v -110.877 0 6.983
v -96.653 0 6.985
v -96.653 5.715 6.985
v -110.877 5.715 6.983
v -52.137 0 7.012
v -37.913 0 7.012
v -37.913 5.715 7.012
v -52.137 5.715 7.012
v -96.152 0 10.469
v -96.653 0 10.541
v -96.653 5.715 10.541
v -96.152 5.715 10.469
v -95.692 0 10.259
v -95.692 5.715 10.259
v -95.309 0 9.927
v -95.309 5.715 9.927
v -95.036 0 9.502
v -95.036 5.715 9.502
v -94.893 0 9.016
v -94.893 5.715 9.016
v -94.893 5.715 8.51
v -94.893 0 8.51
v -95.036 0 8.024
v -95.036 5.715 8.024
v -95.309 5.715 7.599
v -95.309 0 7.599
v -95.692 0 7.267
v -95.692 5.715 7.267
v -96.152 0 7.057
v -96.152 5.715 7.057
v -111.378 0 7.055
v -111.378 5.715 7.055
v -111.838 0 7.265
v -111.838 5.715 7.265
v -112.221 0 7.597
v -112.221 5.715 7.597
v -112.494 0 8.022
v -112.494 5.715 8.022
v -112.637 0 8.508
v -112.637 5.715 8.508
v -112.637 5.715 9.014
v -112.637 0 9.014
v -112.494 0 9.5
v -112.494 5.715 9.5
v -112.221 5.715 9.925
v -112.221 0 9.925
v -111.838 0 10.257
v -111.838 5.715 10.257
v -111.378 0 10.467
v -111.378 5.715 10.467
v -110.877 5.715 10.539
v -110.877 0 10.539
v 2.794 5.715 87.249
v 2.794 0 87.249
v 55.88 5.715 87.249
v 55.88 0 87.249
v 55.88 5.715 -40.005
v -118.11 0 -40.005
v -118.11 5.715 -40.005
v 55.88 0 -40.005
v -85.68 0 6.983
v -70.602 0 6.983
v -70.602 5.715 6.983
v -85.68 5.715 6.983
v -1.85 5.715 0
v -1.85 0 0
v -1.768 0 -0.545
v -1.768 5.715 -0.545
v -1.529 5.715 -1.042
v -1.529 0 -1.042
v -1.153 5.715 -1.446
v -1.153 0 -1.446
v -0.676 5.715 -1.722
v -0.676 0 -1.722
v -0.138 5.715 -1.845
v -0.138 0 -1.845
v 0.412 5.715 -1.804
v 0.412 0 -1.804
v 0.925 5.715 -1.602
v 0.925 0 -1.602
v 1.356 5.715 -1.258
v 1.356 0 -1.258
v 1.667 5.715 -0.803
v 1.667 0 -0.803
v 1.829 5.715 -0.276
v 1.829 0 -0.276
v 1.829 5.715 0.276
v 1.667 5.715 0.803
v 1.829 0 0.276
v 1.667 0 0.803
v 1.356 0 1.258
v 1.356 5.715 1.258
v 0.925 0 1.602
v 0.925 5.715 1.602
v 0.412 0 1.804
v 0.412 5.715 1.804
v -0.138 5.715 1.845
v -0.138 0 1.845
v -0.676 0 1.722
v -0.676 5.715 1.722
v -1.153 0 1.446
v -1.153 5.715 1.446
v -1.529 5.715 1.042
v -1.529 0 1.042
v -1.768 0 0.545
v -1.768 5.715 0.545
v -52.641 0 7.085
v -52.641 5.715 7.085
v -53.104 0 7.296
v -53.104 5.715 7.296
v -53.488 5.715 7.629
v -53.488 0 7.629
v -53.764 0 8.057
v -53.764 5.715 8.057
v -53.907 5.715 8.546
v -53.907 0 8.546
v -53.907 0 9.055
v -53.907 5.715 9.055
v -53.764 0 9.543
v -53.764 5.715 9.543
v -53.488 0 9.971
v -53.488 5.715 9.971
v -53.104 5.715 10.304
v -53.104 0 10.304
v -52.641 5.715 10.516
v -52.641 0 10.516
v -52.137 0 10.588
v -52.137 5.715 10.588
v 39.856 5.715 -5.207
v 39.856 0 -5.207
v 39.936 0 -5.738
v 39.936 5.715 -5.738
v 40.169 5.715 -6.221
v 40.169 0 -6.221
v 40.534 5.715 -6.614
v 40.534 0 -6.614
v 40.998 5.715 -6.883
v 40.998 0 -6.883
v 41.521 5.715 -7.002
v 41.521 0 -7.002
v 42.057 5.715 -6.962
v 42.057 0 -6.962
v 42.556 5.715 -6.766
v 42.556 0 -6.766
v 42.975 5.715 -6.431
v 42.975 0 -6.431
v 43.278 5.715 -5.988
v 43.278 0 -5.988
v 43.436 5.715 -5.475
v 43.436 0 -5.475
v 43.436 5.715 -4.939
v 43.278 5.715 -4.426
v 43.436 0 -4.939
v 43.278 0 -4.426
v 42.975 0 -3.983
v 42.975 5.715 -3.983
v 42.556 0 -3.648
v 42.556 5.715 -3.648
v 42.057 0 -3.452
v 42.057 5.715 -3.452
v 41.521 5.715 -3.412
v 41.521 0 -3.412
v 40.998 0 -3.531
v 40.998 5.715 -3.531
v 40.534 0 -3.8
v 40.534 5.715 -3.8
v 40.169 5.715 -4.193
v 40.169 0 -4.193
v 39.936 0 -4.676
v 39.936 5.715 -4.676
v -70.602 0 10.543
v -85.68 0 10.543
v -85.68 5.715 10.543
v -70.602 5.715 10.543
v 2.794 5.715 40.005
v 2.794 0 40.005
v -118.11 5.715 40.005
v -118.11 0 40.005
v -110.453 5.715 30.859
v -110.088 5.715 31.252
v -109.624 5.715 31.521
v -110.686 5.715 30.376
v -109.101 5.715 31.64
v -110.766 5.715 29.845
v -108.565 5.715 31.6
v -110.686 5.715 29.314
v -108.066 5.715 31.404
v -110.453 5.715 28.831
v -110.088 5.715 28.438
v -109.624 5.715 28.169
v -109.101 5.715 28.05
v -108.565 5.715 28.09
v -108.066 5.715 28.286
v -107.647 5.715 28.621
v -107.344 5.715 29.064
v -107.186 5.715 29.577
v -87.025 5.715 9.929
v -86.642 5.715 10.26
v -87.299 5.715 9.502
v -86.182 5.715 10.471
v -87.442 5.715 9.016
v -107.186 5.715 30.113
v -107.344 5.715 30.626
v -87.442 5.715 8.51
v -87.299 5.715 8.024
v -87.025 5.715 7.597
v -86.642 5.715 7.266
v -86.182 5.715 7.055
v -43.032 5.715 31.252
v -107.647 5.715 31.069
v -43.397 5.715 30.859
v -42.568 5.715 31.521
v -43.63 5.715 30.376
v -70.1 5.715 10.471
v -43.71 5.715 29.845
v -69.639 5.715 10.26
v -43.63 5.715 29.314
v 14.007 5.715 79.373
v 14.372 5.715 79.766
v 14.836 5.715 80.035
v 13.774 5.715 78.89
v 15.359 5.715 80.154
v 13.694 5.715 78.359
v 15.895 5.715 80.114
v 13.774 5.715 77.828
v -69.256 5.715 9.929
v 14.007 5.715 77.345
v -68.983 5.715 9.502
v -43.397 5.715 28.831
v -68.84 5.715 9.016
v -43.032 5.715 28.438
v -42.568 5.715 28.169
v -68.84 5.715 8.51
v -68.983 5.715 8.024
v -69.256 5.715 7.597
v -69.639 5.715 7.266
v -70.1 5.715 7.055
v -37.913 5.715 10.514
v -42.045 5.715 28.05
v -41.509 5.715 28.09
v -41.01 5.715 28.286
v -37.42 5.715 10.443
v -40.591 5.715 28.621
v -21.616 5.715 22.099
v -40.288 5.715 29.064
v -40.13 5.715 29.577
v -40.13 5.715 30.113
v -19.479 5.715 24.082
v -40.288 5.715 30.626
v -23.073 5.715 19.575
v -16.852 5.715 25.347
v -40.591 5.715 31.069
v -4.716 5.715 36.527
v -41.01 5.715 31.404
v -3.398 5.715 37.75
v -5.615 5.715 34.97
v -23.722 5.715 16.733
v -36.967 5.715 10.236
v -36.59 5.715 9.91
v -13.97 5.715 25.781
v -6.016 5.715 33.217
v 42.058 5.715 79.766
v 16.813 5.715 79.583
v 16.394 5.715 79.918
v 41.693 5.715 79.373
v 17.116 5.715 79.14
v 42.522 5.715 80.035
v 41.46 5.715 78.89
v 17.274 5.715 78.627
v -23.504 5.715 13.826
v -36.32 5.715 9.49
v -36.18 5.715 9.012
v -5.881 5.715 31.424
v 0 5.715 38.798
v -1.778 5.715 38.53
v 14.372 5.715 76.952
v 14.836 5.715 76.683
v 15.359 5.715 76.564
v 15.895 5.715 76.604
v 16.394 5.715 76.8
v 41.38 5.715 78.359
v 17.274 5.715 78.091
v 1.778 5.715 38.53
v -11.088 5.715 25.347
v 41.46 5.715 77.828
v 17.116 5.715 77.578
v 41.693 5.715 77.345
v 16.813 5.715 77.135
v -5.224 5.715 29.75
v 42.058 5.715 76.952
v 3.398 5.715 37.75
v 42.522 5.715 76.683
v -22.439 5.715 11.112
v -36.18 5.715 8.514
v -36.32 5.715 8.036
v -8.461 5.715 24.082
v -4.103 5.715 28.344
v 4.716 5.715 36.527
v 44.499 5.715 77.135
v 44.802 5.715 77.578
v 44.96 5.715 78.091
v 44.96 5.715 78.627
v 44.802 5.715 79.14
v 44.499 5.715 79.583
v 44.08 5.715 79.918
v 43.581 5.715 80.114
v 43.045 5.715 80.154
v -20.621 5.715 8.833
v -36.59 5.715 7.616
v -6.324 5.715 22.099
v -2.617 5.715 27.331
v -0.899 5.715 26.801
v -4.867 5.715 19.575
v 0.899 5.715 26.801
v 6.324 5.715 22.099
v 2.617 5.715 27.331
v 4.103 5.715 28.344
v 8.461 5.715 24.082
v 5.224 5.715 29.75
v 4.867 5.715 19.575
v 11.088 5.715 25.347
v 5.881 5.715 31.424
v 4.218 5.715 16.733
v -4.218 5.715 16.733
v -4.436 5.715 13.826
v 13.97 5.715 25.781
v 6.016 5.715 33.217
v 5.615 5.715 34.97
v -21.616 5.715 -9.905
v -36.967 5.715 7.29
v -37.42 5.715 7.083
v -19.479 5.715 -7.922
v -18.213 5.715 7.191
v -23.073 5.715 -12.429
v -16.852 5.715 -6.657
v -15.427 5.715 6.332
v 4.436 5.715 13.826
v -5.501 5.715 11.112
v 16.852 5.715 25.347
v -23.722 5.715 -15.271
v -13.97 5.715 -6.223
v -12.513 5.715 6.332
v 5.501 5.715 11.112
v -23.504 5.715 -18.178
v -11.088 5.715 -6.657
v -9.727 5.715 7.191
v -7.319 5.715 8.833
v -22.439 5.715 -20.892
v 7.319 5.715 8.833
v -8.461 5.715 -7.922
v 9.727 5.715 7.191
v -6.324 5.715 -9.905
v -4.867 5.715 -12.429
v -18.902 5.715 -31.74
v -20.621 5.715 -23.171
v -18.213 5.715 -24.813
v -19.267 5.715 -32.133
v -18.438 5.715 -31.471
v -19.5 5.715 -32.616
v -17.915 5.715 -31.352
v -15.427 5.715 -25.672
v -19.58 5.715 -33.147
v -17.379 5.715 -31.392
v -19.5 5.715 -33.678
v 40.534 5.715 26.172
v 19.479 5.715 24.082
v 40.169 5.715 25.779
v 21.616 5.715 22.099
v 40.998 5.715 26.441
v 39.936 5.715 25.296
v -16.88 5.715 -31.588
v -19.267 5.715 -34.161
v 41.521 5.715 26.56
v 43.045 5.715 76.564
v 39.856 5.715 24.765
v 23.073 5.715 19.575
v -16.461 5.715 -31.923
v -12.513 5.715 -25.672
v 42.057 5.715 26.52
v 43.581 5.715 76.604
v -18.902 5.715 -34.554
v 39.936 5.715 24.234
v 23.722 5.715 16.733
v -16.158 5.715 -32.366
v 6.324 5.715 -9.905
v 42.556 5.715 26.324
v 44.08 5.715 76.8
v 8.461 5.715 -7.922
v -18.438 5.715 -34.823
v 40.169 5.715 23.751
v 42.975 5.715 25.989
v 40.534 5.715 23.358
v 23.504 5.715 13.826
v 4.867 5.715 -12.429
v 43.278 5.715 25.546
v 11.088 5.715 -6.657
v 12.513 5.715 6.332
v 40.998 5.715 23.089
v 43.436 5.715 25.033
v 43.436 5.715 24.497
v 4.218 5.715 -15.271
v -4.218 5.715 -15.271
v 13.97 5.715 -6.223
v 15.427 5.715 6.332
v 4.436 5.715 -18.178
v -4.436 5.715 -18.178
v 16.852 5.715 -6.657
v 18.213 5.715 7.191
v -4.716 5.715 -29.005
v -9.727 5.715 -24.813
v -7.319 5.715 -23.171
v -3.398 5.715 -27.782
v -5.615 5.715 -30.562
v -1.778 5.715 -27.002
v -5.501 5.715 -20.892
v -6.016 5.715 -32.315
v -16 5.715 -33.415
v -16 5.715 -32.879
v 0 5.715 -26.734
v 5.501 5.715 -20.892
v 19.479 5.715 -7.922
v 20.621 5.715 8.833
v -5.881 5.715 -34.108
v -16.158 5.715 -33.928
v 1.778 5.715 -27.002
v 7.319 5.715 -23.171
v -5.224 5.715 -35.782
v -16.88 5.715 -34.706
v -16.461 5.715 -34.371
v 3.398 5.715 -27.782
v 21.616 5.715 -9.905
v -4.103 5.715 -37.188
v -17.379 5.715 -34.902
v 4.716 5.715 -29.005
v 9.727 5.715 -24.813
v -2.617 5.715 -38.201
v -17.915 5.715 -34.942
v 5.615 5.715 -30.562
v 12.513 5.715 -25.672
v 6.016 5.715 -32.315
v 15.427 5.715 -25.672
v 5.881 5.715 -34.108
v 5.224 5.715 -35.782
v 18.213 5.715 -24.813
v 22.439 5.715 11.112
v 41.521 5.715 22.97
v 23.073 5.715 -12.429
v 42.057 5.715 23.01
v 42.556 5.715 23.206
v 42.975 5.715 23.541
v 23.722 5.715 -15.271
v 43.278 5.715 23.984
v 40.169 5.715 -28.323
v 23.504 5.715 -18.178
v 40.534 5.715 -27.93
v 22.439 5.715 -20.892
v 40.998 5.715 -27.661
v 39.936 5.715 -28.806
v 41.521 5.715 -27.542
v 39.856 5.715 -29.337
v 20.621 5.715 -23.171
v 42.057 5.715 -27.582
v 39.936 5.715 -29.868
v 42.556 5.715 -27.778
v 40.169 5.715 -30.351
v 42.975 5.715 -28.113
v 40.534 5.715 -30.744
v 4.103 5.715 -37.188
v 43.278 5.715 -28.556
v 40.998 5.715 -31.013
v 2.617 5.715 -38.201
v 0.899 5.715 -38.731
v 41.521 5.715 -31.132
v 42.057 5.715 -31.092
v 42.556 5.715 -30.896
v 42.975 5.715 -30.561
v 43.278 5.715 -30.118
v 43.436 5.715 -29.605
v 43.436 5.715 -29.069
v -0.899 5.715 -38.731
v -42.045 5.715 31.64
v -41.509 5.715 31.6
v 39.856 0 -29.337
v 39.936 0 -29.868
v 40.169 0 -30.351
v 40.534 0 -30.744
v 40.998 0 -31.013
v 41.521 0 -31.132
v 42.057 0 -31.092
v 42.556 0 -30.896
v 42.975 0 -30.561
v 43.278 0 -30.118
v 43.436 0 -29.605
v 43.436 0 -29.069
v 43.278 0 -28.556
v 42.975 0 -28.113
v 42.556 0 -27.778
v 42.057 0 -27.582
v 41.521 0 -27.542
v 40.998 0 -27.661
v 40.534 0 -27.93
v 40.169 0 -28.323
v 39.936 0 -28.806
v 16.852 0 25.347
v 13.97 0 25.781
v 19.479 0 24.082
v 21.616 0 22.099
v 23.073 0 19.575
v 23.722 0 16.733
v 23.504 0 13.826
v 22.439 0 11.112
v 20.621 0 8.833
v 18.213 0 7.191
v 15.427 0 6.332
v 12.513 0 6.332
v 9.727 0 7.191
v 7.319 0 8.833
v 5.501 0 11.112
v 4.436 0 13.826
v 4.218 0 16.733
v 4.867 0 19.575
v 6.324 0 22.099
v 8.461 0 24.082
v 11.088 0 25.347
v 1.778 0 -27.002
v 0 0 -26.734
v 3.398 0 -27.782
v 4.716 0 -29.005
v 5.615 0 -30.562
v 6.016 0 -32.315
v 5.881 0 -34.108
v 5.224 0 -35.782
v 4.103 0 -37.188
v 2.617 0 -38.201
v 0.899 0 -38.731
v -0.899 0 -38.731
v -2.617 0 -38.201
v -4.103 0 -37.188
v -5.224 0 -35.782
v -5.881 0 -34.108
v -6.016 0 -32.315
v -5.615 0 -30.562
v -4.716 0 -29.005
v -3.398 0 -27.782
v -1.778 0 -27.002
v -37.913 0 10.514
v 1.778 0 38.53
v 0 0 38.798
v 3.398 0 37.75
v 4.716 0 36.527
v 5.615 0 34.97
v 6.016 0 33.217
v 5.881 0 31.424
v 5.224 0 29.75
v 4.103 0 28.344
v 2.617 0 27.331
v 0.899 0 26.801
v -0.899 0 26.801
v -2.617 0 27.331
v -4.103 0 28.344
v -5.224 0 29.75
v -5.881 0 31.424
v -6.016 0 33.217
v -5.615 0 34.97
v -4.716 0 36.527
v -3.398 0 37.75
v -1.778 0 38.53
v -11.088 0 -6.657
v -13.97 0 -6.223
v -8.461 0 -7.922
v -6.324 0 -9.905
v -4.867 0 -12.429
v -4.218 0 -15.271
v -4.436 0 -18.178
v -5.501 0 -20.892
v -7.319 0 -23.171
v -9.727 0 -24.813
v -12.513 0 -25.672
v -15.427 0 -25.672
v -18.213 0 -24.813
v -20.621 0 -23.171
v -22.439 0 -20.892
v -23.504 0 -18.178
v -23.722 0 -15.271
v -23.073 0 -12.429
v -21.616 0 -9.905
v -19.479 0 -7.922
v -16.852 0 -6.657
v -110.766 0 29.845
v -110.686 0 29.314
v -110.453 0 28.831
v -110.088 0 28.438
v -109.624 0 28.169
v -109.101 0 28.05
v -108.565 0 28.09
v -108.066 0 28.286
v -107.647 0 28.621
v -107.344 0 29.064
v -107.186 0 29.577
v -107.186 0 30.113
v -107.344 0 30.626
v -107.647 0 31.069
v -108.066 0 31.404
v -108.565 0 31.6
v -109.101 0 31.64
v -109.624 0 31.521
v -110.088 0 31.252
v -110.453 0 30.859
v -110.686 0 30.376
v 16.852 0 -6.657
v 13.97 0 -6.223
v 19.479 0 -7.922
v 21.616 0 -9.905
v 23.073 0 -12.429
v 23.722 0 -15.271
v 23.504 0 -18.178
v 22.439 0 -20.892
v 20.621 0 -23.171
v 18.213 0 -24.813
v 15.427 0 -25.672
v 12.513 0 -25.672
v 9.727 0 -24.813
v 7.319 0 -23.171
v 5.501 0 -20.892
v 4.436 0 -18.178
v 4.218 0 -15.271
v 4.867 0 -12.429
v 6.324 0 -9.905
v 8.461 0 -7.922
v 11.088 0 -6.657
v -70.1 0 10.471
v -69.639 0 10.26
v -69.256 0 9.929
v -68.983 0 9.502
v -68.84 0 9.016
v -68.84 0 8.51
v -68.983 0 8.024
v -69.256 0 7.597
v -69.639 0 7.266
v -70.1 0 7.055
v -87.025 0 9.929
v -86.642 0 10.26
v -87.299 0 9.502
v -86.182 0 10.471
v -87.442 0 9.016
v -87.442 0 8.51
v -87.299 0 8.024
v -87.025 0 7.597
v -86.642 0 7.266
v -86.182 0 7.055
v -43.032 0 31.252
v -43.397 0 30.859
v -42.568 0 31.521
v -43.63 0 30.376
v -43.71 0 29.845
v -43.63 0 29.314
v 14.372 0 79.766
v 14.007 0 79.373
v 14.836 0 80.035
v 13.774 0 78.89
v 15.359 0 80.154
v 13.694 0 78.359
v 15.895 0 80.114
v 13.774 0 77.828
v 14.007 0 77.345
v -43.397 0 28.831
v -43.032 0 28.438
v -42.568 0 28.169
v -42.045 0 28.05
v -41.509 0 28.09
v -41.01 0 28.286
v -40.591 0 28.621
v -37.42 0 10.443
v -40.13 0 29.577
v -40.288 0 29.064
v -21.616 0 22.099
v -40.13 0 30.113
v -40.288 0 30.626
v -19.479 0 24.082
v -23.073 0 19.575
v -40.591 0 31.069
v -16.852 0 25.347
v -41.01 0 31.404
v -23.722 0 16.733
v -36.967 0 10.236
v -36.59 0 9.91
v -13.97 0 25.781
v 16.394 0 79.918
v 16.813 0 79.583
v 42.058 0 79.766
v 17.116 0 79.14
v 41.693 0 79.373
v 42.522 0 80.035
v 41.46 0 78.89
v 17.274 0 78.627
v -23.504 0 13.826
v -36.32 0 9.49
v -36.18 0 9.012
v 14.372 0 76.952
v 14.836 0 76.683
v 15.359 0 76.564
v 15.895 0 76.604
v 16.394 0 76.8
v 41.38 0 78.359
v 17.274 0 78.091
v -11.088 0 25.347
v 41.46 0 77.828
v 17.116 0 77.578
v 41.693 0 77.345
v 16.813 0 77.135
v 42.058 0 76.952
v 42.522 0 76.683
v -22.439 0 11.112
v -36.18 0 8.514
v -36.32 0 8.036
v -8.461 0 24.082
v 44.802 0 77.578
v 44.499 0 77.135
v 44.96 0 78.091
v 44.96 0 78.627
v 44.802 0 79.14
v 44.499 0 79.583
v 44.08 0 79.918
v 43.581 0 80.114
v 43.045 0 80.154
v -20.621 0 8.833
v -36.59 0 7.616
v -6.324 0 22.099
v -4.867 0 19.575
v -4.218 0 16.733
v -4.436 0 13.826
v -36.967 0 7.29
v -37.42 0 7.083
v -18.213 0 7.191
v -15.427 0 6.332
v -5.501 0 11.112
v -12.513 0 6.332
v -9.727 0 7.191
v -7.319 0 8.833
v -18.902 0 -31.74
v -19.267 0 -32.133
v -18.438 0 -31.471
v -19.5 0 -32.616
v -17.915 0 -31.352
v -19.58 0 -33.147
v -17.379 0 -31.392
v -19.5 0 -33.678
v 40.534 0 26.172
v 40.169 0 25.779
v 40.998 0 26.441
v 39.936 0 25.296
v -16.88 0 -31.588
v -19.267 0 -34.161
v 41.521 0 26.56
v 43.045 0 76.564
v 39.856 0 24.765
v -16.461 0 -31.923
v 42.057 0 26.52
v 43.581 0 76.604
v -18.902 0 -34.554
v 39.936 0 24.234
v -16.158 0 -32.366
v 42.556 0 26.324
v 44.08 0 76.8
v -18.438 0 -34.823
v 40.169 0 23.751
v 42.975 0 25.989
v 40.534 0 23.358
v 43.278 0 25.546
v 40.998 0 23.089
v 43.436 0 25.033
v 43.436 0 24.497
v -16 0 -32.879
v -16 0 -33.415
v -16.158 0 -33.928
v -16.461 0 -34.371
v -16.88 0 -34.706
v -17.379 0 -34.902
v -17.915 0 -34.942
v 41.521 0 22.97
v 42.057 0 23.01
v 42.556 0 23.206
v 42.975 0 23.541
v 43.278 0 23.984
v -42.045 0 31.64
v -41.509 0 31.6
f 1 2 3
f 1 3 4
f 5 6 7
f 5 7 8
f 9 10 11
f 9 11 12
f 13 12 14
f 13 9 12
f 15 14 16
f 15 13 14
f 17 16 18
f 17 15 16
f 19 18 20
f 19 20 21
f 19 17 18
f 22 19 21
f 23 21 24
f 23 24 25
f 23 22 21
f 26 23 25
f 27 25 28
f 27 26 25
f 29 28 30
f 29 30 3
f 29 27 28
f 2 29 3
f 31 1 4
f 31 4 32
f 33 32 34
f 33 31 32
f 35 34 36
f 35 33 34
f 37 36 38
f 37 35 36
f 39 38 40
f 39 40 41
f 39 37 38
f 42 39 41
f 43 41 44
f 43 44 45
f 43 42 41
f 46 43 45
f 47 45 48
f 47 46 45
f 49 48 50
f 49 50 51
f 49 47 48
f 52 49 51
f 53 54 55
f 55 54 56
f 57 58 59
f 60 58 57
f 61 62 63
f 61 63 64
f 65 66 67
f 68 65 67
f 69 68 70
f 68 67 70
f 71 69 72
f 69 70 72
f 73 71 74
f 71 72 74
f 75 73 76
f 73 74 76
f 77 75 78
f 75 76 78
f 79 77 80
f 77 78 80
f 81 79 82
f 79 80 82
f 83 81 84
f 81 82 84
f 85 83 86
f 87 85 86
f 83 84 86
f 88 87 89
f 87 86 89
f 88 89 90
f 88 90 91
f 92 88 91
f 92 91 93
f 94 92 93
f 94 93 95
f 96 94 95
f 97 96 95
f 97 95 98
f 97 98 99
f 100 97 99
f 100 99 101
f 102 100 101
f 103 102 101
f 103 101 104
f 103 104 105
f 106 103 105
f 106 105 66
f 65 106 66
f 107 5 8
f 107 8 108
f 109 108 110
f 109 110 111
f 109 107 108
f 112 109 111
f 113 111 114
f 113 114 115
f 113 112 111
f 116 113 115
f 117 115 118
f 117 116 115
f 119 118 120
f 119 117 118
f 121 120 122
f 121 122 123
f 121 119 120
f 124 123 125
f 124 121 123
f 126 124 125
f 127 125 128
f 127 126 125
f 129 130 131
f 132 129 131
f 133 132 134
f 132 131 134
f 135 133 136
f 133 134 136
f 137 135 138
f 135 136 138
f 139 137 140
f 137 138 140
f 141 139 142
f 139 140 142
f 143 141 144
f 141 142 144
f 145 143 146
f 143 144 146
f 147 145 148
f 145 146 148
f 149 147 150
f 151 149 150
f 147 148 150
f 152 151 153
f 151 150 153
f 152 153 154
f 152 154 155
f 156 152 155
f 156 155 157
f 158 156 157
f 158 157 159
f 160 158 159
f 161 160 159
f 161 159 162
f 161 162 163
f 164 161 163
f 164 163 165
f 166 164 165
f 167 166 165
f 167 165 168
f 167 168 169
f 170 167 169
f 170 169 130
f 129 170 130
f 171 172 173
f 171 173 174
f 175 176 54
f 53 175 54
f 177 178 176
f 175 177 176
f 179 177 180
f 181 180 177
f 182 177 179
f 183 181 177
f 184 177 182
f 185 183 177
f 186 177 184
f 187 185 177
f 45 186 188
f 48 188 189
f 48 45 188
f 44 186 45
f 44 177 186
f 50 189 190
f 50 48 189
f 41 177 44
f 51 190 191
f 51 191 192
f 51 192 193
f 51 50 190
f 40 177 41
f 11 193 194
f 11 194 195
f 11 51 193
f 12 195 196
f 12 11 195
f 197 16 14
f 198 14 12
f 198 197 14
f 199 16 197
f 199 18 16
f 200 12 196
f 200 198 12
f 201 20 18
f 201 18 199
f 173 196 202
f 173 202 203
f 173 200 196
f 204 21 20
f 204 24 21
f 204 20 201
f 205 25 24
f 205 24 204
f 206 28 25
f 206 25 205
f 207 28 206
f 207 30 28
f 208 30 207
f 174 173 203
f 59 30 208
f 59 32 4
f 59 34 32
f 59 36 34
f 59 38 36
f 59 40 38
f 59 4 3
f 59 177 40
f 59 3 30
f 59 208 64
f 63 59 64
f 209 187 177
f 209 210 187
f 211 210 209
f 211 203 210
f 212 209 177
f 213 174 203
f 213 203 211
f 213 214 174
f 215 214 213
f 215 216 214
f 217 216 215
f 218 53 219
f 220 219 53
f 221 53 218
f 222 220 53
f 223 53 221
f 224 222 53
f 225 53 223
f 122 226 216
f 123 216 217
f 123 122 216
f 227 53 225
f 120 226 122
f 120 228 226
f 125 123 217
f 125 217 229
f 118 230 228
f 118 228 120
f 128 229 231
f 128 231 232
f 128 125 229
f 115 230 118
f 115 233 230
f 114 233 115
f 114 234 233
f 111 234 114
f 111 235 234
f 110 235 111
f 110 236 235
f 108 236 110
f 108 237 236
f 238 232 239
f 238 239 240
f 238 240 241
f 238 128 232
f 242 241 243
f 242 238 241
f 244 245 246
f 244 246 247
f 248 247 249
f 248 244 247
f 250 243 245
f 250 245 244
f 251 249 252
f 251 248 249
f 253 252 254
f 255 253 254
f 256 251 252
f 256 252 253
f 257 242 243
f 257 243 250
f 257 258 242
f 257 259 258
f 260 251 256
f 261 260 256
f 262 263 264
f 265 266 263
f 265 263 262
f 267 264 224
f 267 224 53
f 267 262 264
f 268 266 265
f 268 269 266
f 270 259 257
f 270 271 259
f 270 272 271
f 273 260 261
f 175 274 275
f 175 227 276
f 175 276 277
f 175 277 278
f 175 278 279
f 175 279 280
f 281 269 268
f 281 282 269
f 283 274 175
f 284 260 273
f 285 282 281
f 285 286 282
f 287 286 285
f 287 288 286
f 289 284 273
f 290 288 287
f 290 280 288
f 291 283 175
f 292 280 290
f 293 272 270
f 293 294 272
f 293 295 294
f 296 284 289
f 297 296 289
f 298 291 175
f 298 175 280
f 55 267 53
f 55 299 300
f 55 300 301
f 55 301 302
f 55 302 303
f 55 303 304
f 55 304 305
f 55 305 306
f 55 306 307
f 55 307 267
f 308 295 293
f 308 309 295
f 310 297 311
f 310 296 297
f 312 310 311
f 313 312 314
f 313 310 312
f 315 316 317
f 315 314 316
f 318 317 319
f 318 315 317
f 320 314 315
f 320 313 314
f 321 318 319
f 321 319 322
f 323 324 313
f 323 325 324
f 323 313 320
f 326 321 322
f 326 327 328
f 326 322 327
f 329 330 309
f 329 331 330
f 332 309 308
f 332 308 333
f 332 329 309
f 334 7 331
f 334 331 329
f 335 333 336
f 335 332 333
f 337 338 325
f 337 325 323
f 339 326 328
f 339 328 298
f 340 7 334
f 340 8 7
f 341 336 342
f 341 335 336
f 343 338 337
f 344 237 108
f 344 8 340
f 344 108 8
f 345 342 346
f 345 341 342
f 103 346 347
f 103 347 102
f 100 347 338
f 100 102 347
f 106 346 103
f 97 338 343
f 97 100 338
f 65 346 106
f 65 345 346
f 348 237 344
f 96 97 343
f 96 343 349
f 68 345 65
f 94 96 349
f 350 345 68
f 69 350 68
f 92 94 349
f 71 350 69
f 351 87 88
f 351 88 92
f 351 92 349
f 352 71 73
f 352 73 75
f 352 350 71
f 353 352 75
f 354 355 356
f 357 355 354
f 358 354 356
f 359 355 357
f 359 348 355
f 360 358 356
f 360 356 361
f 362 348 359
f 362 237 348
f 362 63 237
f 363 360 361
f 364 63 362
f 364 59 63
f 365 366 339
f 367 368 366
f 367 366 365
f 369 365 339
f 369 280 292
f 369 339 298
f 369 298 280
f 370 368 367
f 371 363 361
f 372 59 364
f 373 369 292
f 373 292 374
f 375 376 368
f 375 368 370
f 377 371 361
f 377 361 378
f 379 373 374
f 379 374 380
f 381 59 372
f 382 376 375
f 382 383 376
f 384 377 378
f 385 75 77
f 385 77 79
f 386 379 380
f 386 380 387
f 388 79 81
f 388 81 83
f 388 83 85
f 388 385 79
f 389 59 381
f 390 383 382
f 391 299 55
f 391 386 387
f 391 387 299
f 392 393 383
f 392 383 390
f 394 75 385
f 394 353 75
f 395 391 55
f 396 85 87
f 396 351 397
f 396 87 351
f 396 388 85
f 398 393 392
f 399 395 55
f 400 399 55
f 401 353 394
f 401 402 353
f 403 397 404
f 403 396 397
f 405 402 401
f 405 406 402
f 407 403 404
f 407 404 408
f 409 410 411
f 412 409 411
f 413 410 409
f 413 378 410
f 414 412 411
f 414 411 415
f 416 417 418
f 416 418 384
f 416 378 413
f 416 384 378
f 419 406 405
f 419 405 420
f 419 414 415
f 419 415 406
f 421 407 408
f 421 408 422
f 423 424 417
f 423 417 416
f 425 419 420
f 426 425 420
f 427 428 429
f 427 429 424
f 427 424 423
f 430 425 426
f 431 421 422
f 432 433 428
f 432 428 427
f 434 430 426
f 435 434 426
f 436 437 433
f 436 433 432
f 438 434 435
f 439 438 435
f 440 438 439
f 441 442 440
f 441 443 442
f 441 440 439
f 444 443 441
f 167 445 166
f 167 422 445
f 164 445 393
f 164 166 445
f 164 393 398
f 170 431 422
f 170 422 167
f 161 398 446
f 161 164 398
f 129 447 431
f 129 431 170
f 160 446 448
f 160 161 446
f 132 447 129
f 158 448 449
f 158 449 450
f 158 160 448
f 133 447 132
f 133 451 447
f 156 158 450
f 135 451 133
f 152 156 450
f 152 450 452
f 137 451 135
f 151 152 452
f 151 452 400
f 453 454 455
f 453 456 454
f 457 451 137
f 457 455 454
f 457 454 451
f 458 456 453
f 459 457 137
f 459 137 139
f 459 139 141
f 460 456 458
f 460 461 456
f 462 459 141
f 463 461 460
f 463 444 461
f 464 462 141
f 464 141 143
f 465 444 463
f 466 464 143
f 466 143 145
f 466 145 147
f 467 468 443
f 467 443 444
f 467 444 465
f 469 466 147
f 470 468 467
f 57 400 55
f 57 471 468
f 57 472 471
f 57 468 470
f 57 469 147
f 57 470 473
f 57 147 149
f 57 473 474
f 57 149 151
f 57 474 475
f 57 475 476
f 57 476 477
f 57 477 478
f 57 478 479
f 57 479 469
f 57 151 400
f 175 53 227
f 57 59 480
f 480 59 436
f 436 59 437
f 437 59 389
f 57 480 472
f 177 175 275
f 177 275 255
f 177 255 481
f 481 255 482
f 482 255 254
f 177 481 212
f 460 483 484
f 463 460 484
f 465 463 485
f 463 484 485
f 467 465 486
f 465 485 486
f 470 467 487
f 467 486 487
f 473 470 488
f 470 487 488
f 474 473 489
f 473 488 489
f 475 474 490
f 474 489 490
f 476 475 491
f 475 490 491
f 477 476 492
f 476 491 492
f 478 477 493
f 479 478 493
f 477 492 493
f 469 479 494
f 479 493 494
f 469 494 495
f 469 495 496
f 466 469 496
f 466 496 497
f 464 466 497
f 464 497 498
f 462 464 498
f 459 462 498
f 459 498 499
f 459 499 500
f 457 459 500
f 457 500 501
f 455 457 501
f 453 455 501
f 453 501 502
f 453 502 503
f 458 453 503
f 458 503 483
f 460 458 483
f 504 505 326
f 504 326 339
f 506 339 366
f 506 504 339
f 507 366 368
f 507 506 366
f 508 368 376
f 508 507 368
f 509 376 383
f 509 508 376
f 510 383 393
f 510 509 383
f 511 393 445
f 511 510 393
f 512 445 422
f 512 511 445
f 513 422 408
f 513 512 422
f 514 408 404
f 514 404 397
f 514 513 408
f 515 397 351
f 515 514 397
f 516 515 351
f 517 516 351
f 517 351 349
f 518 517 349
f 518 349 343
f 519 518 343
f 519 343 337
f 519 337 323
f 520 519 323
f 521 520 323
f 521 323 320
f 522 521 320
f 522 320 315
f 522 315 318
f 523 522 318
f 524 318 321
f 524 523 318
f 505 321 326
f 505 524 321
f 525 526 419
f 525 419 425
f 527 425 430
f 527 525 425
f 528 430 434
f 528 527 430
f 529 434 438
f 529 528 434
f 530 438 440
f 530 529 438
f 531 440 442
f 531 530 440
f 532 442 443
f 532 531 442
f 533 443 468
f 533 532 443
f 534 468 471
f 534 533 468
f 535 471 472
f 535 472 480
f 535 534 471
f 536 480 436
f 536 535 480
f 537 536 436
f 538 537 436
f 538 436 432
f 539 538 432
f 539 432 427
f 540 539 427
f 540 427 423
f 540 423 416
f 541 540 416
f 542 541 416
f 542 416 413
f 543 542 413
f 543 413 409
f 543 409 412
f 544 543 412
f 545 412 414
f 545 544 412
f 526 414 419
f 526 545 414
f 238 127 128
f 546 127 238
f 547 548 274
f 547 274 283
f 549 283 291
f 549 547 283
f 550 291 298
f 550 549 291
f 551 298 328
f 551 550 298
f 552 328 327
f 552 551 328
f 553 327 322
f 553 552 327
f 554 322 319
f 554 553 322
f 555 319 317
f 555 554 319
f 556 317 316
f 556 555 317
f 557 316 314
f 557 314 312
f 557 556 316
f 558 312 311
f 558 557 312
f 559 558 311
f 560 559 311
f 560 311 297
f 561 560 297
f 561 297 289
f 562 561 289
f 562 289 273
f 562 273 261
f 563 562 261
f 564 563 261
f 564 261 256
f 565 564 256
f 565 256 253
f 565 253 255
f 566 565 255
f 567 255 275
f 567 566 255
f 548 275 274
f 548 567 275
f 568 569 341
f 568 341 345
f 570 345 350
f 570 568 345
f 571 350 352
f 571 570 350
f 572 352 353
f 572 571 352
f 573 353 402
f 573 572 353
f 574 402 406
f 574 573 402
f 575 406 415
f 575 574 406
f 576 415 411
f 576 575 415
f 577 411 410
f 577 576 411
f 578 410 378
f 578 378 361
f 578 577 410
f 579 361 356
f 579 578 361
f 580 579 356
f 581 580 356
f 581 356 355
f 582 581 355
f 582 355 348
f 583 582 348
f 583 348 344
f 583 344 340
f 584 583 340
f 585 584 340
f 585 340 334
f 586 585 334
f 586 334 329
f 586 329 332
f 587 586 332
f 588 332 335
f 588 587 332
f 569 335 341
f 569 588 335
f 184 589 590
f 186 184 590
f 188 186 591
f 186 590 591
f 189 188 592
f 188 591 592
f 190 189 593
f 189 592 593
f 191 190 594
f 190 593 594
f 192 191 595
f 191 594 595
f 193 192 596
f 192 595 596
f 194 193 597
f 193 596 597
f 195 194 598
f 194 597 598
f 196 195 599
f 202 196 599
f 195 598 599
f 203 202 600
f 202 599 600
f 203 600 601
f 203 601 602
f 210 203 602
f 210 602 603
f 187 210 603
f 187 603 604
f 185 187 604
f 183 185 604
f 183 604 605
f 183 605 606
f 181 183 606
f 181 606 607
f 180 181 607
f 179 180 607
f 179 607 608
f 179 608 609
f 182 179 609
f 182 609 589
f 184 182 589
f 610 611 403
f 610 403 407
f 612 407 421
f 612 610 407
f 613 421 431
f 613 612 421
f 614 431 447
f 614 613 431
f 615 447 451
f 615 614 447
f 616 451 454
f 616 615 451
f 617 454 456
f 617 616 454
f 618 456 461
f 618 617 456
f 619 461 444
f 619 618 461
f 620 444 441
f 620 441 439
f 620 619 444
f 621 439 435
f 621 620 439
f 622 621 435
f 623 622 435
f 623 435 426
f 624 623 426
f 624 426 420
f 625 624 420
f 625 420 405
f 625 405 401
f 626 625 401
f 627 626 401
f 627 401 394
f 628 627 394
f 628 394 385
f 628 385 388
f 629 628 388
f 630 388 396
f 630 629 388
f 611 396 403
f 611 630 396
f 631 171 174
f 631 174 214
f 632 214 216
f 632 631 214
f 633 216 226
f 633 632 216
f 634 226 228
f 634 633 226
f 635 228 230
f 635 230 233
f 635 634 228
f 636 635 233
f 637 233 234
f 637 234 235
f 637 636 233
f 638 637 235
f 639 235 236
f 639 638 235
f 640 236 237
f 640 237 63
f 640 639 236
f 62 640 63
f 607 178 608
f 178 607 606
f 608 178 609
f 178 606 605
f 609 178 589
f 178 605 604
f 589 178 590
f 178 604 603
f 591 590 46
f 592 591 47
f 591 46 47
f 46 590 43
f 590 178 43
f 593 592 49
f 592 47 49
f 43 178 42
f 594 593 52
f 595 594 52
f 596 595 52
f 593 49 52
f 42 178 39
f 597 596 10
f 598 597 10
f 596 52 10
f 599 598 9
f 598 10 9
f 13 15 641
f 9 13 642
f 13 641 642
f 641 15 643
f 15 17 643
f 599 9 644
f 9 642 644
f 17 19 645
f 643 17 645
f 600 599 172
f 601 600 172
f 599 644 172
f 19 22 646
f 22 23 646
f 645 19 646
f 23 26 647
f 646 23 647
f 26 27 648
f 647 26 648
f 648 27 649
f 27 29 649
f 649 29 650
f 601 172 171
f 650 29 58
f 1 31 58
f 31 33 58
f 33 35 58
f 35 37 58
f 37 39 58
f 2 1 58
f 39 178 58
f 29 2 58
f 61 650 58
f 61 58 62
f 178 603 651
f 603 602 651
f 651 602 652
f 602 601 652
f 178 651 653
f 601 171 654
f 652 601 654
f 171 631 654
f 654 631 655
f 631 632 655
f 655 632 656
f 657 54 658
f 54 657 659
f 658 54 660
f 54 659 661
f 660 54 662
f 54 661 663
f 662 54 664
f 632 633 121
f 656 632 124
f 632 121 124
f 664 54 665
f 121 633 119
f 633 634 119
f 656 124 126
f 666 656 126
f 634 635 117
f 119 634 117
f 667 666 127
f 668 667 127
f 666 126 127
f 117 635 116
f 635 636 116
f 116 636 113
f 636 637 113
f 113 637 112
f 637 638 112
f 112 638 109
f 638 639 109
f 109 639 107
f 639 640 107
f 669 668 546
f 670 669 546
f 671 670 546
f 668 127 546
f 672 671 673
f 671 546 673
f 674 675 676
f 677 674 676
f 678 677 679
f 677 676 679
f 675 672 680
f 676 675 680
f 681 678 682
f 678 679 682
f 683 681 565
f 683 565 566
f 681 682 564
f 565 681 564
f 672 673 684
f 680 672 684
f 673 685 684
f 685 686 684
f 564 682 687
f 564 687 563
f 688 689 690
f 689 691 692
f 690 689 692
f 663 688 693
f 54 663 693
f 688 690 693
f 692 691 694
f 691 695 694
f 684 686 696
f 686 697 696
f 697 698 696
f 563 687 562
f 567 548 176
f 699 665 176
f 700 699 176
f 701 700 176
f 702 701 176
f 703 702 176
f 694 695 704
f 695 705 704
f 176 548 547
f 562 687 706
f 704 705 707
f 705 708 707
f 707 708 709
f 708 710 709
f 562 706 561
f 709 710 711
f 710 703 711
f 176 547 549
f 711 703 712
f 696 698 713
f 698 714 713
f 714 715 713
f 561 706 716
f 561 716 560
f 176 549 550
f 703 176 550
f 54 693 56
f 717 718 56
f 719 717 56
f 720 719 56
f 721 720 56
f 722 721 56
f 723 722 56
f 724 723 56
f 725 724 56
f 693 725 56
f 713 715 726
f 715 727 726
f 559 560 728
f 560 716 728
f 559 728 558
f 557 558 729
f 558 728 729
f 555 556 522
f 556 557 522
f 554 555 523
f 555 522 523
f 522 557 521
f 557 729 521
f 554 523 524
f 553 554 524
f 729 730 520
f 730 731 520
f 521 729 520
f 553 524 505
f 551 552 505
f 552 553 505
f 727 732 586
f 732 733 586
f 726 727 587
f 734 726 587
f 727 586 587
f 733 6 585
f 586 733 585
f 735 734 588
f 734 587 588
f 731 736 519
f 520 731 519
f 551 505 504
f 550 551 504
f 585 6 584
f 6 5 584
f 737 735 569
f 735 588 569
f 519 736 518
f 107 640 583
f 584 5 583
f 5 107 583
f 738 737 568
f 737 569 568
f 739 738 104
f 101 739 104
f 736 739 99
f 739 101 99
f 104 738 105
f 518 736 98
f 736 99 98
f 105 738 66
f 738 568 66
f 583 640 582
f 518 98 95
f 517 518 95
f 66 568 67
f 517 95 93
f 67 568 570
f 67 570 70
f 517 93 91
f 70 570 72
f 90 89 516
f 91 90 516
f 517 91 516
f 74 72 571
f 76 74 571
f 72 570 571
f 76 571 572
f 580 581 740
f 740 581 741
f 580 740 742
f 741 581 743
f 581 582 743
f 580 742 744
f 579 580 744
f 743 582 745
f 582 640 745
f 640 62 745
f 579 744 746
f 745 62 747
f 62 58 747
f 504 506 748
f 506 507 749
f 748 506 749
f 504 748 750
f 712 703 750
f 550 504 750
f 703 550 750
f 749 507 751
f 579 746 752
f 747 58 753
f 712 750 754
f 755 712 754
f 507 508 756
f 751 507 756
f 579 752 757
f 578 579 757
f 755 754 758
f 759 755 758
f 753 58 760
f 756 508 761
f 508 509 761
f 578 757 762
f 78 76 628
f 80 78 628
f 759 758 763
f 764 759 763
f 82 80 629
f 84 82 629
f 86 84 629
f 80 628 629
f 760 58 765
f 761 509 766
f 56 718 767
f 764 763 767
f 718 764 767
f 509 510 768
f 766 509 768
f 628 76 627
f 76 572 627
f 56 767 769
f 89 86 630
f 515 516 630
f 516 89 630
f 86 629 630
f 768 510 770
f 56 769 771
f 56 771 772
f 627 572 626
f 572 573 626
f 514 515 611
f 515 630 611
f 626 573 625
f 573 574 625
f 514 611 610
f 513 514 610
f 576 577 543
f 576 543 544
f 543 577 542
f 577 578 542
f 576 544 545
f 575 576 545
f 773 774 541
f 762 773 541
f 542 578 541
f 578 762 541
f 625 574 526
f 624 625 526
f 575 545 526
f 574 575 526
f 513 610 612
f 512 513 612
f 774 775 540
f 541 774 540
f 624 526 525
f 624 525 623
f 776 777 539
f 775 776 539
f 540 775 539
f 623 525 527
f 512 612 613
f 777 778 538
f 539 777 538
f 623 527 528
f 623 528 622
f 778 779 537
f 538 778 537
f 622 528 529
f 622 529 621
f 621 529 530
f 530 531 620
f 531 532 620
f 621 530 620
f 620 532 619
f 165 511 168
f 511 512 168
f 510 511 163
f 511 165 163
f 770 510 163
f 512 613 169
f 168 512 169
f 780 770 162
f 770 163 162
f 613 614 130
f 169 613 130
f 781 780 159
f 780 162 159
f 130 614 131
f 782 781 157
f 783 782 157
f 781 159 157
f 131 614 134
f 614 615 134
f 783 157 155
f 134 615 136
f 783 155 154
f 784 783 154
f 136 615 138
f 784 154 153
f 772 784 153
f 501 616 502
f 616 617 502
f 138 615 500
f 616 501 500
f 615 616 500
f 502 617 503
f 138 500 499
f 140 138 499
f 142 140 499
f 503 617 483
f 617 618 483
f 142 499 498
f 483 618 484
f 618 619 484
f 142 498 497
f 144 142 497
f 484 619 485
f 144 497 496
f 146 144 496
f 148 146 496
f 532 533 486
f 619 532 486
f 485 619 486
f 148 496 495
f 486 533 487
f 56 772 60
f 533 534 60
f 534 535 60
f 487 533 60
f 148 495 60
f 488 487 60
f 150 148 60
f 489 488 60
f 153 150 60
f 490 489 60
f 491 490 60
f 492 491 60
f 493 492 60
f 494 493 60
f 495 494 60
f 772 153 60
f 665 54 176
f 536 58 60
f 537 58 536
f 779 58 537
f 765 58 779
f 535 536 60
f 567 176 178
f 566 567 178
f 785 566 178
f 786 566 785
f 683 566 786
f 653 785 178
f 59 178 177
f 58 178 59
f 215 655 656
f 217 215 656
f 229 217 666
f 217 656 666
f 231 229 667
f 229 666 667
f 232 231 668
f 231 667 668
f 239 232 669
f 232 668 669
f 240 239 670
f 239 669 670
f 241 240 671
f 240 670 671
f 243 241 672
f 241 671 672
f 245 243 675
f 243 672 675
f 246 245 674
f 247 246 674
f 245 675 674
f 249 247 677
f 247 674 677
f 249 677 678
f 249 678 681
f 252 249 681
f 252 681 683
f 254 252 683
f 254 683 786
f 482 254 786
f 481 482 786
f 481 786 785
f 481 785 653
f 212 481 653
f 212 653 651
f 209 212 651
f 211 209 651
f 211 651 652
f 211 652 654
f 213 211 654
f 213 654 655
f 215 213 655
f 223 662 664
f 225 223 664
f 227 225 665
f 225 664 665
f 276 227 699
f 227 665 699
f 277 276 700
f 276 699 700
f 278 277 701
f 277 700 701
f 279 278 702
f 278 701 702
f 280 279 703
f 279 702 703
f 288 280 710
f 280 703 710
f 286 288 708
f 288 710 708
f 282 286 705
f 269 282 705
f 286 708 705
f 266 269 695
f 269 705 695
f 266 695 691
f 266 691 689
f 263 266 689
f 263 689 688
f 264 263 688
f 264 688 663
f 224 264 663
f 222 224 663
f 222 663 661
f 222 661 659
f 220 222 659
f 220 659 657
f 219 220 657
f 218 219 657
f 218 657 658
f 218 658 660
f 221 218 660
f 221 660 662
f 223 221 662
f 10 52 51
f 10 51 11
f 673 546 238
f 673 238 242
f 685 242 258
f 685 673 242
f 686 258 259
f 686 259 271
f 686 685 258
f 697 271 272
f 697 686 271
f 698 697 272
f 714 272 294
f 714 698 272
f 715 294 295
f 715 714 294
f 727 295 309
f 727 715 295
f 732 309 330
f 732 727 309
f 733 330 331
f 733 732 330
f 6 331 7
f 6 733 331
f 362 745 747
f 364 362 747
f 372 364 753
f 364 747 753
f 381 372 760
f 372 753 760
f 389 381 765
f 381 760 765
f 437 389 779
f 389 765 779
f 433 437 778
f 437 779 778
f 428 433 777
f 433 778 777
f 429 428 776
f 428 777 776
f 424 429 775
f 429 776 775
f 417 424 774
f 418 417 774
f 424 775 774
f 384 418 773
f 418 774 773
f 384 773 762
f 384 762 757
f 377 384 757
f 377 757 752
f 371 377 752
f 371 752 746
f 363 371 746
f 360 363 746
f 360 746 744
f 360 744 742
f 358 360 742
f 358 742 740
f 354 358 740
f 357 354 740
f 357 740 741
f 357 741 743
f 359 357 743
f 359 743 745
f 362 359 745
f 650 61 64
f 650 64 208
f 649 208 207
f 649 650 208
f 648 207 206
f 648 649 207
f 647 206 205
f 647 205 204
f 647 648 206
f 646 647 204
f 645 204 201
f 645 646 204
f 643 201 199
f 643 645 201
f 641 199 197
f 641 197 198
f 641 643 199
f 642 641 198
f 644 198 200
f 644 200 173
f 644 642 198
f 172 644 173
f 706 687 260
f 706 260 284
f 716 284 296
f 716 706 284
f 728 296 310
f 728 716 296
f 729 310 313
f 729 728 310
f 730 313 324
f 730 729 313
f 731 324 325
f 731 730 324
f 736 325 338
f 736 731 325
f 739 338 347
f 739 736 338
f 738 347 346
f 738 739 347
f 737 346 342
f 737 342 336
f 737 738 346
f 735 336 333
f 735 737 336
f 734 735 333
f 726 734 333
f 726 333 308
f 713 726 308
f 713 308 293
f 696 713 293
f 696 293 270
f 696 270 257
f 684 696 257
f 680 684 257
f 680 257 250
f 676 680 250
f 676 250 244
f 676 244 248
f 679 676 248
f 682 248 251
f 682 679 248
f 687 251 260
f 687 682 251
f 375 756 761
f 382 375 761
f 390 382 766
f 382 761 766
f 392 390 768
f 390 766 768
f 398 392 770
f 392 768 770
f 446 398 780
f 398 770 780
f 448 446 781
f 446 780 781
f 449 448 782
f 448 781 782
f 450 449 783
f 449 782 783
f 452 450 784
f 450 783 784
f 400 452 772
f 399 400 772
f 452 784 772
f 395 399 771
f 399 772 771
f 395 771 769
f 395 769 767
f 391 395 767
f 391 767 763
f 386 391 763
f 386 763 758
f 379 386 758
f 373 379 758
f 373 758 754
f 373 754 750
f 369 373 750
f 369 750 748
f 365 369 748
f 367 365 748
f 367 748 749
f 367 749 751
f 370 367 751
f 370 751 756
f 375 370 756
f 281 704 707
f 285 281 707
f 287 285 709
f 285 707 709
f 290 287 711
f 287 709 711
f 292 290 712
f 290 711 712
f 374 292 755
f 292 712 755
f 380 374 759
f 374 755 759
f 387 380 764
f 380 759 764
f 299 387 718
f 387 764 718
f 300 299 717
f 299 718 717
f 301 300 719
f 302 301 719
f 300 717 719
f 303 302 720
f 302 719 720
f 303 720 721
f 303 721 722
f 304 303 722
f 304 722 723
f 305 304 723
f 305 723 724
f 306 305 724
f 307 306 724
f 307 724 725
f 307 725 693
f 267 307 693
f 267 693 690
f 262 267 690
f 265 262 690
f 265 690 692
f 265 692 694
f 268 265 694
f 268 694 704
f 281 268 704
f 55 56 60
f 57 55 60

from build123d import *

# Parameters (mm, degrees)
SKETCH1_W                = 88.9
SKETCH1_H                = 80.01
SKETCH1_R                = 9.779
SKETCH1_R_2              = 6.0325
SKETCH1_W_2              = 73.66
SKETCH1_W_3              = 11.43
BOSS_EXTRUDE1_DEPTH      = 5.715
M3_CLEARANCE_HOLE1_D     = 3.6
M3_CLEARANCE_HOLE1_DEPTH = 25.4
M3_CLEARANCE_HOLE1_TIP   = 1.081549114
M3_CLEARANCE_HOLE2_D     = 3.7
M3_CLEARANCE_HOLE2_DEPTH = 25.4
M3_CLEARANCE_HOLE2_TIP   = 1.111592145
CUT_EXTRUDE1_START       = -5.715
CUT_EXTRUDE1_DEPTH       = 5.715


# Read off the part's stored shape, not the designer's step: Cut-Extrude1
with BuildPart() as part:
    # Sketch1 → Boss-Extrude1 (new body)
    # profile 1 of 4: a face of its own
    with BuildSketch(Plane(origin=(0, 0, 0), x_dir=(1, 0, 0), z_dir=(0, 1, 0))):
        Rectangle(SKETCH1_W, SKETCH1_H)
        with Locations(Location((-13.97, -16.002, 0), (0, 0, 270))):
            Circle(SKETCH1_R, mode=Mode.SUBTRACT)
        with Locations(Location((13.97, -16.002, 0), (0, 0, 270))):
            Circle(SKETCH1_R, mode=Mode.SUBTRACT)
        with Locations(Location((-13.97, 16.002, 0), (0, 0, 270))):
            Circle(SKETCH1_R, mode=Mode.SUBTRACT)
        with Locations(Location((13.97, 16.002, 0), (0, 0, 270))):
            Circle(SKETCH1_R, mode=Mode.SUBTRACT)
        with Locations(Location((0, 32.766, 0), (0, 0, 270))):
            Circle(SKETCH1_R_2, mode=Mode.SUBTRACT)
        with Locations(Location((0, -32.766, 0), (0, 0, 270))):
            Circle(SKETCH1_R_2, mode=Mode.SUBTRACT)
    # profile 2 of 4: a face of its own
    with BuildSketch(Plane(origin=(0, 0, 0), x_dir=(1, 0, 0), z_dir=(0, 1, 0))):
        with Locations((-81.28, 0)):
            Rectangle(SKETCH1_W_2, SKETCH1_H)
    # profile 3 of 4: a face of its own
    with BuildSketch(Plane(origin=(0, 0, 0), x_dir=(1, 0, 0), z_dir=(0, 1, 0))):
        with Locations((50.165, 0)):
            Rectangle(SKETCH1_W_3, SKETCH1_H)
    # profile 4 of 4: a face of its own
    with BuildSketch(Plane(origin=(0, 0, 0), x_dir=(1, 0, 0), z_dir=(0, 1, 0))):
        Polygon((55.88, -40.005), (44.45, -40.005), (2.794, -40.005), (2.794, -87.249), (55.88, -87.249), align=None)
    extrude(amount=BOSS_EXTRUDE1_DEPTH)

    # M3 Clearance Hole1
    with Locations(Plane(origin=(0, 5.715, 0), x_dir=(1, 0, 0), z_dir=(0, 1, 0))):
        with Locations((-17.78, 33.147), (41.656, 29.337), (41.656, 5.207), (41.656, -24.765), (43.18, -78.359), (15.494, -78.359), (-41.91, -29.845), (-108.966, -29.845)):
            Hole(M3_CLEARANCE_HOLE1_D / 2, depth=M3_CLEARANCE_HOLE1_DEPTH)
            with Locations((0, 0, -(M3_CLEARANCE_HOLE1_DEPTH + M3_CLEARANCE_HOLE1_TIP / 2))):  # 118° drill point
                Cone(0, M3_CLEARANCE_HOLE1_D / 2, M3_CLEARANCE_HOLE1_TIP, mode=Mode.SUBTRACT)

    # M3 Clearance Hole2
    with Locations(Plane(origin=(0, 5.715, 0), x_dir=(1, 0, 0), z_dir=(0, 1, 0))):
        with Locations((0, 0)):
            Hole(M3_CLEARANCE_HOLE2_D / 2, depth=M3_CLEARANCE_HOLE2_DEPTH)
            with Locations((0, 0, -(M3_CLEARANCE_HOLE2_DEPTH + M3_CLEARANCE_HOLE2_TIP / 2))):  # 118° drill point
                Cone(0, M3_CLEARANCE_HOLE2_D / 2, M3_CLEARANCE_HOLE2_TIP, mode=Mode.SUBTRACT)

    # Cut-Extrude1 outline → Cut-Extrude1 (cut)
    with BuildSketch(Plane(origin=(0, 5.715, 0), x_dir=(1, 0, 0), z_dir=(0, 1, 0)).offset(CUT_EXTRUDE1_START)):
        with BuildLine():
            Line((-52.137072336, -10.588243938), (-37.913072336, -10.513831599))
            ThreePointArc((-37.913072336, -10.513831599), (-36.162240737, -8.763), (-37.913072336, -7.012168401))
            Line((-37.913072336, -7.012168401), (-52.137072336, -7.012168401))
            ThreePointArc((-52.137072336, -7.012168401), (-53.925110105, -8.80020617), (-52.137072336, -10.588243938))
        make_face()
        with BuildLine():
            Line((-110.876944468, -10.539089177), (-96.652944596, -10.541))
            ThreePointArc((-96.652944596, -10.541), (-94.874944596, -8.763), (-96.652944596, -6.985))
            Line((-96.652944596, -6.985), (-110.876944468, -6.983089177))
            ThreePointArc((-110.876944468, -6.983089177), (-112.654944468, -8.761089177), (-110.876944468, -10.539089177))
        make_face()
        with BuildLine():
            ThreePointArc((-85.680129902, -6.983089177), (-87.460040724, -8.763), (-85.680129902, -10.542910823))
            Line((-85.680129902, -10.542910823), (-70.60161816, -10.542910823))
            ThreePointArc((-70.60161816, -10.542910823), (-68.821707338, -8.763), (-70.60161816, -6.983089177))
            Line((-70.60161816, -6.983089177), (-85.680129902, -6.983089177))
        make_face()
    extrude(amount=CUT_EXTRUDE1_DEPTH, mode=Mode.SUBTRACT)


solid = part.part
